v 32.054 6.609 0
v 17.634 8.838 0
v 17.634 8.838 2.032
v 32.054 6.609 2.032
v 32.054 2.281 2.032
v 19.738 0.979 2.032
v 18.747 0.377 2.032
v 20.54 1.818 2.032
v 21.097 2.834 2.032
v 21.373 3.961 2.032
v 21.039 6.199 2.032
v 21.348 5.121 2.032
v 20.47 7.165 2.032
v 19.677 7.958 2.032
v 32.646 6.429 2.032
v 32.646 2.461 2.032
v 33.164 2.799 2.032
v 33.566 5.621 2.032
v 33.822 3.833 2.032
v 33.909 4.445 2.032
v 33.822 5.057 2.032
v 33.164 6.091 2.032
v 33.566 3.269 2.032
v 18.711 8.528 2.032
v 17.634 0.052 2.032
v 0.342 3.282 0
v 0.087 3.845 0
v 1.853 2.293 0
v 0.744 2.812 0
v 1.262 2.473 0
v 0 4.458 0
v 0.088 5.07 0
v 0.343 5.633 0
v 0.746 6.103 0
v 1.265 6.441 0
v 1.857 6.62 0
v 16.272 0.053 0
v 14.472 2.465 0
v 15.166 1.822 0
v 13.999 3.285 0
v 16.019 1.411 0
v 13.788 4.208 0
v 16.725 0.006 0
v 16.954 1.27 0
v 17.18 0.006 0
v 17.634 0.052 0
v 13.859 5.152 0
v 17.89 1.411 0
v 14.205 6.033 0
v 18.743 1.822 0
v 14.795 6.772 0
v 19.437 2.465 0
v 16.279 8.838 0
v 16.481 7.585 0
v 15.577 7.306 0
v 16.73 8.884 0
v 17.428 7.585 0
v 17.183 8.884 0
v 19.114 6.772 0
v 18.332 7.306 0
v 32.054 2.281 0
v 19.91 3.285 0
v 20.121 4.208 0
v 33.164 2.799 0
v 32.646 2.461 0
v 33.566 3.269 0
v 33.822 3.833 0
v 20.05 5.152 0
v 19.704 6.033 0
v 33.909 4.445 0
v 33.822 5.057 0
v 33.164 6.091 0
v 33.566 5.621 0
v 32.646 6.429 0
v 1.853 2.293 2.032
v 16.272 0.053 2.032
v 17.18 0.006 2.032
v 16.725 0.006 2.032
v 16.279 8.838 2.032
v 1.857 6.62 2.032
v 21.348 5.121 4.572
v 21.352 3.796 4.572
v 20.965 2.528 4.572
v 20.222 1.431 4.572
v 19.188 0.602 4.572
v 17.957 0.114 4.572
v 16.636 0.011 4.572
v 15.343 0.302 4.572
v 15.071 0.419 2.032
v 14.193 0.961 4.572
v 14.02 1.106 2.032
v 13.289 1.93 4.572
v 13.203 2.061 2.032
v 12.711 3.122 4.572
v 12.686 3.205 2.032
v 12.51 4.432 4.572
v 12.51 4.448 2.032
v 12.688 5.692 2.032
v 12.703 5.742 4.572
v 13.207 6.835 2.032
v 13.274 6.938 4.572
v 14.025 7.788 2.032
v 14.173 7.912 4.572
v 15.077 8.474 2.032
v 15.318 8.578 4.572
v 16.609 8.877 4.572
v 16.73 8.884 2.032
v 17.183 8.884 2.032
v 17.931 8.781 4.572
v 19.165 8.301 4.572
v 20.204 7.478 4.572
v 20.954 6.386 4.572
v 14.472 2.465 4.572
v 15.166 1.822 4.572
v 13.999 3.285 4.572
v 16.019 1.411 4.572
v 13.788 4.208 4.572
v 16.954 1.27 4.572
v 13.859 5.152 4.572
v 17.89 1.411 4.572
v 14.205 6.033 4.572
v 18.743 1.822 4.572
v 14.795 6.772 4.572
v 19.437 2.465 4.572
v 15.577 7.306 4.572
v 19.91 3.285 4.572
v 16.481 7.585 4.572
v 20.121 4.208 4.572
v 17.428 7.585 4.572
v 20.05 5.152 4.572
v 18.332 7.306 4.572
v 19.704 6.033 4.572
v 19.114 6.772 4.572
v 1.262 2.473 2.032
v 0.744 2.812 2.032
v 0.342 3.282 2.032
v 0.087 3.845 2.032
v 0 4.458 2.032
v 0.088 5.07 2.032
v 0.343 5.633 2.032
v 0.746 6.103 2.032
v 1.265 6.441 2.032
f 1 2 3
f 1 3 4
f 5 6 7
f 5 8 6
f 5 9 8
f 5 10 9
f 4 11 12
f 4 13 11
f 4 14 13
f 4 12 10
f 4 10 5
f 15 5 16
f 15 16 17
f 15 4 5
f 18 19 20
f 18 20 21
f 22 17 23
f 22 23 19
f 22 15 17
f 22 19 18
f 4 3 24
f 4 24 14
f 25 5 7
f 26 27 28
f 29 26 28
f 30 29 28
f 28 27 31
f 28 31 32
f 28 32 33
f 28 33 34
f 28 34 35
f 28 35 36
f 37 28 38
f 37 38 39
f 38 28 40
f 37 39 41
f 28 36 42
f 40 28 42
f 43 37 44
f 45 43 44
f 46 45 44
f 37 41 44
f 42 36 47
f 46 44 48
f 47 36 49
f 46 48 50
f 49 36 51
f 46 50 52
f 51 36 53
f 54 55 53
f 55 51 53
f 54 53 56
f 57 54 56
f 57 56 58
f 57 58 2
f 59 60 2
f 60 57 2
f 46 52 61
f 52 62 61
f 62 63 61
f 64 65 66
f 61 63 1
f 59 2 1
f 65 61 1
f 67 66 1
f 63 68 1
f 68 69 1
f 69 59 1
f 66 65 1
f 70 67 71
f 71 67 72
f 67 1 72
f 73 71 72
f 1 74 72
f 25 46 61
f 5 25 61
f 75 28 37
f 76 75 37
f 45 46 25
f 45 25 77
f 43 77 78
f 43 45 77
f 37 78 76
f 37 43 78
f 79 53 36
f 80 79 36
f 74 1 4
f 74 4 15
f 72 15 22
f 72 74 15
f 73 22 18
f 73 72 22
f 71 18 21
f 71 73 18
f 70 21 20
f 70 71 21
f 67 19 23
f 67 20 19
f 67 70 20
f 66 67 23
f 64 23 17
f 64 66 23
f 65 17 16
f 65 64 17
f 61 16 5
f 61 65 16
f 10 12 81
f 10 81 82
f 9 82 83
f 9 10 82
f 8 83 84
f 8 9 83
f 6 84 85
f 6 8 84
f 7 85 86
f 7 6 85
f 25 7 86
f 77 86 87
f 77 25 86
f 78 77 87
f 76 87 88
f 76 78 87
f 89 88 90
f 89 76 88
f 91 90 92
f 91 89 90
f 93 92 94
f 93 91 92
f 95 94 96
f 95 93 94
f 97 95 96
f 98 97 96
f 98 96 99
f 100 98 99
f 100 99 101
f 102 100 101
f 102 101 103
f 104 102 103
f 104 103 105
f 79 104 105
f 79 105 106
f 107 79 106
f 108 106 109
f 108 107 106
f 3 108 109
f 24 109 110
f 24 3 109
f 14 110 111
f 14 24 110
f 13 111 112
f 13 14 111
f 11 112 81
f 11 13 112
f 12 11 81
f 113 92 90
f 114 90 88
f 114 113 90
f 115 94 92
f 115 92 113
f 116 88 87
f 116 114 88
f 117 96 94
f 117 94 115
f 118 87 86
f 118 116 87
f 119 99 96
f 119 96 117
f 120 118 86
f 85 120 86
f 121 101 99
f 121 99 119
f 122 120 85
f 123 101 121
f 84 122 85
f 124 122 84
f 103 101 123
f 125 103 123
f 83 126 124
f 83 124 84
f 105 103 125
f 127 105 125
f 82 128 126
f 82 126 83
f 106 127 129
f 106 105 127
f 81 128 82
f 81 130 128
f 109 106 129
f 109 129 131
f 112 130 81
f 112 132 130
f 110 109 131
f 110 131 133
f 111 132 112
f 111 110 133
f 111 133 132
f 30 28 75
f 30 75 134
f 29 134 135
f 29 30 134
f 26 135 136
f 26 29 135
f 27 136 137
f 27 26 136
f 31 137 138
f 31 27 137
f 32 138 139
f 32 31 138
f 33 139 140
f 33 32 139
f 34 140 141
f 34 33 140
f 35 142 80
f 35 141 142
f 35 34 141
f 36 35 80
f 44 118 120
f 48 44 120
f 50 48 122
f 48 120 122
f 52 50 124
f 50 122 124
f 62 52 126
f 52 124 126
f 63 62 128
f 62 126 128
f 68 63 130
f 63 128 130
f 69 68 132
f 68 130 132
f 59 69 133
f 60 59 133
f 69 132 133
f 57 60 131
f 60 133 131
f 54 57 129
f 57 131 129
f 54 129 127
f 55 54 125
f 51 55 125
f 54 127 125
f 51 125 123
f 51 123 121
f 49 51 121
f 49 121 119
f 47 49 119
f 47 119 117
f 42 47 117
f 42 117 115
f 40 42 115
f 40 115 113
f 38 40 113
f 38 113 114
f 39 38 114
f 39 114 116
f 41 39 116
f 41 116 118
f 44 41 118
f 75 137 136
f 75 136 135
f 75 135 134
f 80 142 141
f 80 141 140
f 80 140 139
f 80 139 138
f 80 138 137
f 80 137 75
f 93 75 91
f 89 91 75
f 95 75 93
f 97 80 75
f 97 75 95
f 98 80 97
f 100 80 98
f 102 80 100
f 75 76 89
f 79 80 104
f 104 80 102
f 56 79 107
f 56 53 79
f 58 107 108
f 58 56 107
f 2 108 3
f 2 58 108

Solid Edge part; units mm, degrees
sketch "Sketch1" plane through (0, 0, 0) normal (0, 0, 1) x (1, 0, 0)
  line L0 (16.2788, 8.8383) -> (1.8566, 6.6201)
  line L1 (1.8533, 2.2927) -> (16.2721, 0.0527)
  line L2 (17.6335, 0.0522) -> (32.0541, 2.2813)
  line L3 (17.6335, 8.8378) -> (32.0541, 6.6087)
  arc A0 (16.2788, 8.8383) -> (17.6335, 8.8378) centre (16.9545, 4.445) cw
  arc A1 (1.8566, 6.6201) -> (1.8533, 2.2927) centre (2.1894, 4.4561) ccw
  arc A2 (16.2721, 0.0527) -> (17.6335, 0.0522) centre (16.9545, 4.445) ccw
  arc A3 (32.0541, 2.2813) -> (32.0541, 6.6087) centre (31.7196, 4.445) ccw
  dimension "D1" = 8.89
  dimension "D2" = 33.909
extrude "Protrusion1" add sketch "Sketch1" along normal blind 2.032
sketch "Sketch2" plane through (16.9545, 4.445, 2.032) normal (0, 0, 1) x (0.9884, 0.152, 0)
  circle A0 centre (0, 0) radius 4.445
extrude "ExtrudedProtrusion_2" add sketch "Sketch2" along normal blind 2.54
hole "Hole_1" at (16.9545, 4.445, 4.572) direction (0, 0, -1) diameter 6.35 end up to next
properties part number "HARDWARE"
